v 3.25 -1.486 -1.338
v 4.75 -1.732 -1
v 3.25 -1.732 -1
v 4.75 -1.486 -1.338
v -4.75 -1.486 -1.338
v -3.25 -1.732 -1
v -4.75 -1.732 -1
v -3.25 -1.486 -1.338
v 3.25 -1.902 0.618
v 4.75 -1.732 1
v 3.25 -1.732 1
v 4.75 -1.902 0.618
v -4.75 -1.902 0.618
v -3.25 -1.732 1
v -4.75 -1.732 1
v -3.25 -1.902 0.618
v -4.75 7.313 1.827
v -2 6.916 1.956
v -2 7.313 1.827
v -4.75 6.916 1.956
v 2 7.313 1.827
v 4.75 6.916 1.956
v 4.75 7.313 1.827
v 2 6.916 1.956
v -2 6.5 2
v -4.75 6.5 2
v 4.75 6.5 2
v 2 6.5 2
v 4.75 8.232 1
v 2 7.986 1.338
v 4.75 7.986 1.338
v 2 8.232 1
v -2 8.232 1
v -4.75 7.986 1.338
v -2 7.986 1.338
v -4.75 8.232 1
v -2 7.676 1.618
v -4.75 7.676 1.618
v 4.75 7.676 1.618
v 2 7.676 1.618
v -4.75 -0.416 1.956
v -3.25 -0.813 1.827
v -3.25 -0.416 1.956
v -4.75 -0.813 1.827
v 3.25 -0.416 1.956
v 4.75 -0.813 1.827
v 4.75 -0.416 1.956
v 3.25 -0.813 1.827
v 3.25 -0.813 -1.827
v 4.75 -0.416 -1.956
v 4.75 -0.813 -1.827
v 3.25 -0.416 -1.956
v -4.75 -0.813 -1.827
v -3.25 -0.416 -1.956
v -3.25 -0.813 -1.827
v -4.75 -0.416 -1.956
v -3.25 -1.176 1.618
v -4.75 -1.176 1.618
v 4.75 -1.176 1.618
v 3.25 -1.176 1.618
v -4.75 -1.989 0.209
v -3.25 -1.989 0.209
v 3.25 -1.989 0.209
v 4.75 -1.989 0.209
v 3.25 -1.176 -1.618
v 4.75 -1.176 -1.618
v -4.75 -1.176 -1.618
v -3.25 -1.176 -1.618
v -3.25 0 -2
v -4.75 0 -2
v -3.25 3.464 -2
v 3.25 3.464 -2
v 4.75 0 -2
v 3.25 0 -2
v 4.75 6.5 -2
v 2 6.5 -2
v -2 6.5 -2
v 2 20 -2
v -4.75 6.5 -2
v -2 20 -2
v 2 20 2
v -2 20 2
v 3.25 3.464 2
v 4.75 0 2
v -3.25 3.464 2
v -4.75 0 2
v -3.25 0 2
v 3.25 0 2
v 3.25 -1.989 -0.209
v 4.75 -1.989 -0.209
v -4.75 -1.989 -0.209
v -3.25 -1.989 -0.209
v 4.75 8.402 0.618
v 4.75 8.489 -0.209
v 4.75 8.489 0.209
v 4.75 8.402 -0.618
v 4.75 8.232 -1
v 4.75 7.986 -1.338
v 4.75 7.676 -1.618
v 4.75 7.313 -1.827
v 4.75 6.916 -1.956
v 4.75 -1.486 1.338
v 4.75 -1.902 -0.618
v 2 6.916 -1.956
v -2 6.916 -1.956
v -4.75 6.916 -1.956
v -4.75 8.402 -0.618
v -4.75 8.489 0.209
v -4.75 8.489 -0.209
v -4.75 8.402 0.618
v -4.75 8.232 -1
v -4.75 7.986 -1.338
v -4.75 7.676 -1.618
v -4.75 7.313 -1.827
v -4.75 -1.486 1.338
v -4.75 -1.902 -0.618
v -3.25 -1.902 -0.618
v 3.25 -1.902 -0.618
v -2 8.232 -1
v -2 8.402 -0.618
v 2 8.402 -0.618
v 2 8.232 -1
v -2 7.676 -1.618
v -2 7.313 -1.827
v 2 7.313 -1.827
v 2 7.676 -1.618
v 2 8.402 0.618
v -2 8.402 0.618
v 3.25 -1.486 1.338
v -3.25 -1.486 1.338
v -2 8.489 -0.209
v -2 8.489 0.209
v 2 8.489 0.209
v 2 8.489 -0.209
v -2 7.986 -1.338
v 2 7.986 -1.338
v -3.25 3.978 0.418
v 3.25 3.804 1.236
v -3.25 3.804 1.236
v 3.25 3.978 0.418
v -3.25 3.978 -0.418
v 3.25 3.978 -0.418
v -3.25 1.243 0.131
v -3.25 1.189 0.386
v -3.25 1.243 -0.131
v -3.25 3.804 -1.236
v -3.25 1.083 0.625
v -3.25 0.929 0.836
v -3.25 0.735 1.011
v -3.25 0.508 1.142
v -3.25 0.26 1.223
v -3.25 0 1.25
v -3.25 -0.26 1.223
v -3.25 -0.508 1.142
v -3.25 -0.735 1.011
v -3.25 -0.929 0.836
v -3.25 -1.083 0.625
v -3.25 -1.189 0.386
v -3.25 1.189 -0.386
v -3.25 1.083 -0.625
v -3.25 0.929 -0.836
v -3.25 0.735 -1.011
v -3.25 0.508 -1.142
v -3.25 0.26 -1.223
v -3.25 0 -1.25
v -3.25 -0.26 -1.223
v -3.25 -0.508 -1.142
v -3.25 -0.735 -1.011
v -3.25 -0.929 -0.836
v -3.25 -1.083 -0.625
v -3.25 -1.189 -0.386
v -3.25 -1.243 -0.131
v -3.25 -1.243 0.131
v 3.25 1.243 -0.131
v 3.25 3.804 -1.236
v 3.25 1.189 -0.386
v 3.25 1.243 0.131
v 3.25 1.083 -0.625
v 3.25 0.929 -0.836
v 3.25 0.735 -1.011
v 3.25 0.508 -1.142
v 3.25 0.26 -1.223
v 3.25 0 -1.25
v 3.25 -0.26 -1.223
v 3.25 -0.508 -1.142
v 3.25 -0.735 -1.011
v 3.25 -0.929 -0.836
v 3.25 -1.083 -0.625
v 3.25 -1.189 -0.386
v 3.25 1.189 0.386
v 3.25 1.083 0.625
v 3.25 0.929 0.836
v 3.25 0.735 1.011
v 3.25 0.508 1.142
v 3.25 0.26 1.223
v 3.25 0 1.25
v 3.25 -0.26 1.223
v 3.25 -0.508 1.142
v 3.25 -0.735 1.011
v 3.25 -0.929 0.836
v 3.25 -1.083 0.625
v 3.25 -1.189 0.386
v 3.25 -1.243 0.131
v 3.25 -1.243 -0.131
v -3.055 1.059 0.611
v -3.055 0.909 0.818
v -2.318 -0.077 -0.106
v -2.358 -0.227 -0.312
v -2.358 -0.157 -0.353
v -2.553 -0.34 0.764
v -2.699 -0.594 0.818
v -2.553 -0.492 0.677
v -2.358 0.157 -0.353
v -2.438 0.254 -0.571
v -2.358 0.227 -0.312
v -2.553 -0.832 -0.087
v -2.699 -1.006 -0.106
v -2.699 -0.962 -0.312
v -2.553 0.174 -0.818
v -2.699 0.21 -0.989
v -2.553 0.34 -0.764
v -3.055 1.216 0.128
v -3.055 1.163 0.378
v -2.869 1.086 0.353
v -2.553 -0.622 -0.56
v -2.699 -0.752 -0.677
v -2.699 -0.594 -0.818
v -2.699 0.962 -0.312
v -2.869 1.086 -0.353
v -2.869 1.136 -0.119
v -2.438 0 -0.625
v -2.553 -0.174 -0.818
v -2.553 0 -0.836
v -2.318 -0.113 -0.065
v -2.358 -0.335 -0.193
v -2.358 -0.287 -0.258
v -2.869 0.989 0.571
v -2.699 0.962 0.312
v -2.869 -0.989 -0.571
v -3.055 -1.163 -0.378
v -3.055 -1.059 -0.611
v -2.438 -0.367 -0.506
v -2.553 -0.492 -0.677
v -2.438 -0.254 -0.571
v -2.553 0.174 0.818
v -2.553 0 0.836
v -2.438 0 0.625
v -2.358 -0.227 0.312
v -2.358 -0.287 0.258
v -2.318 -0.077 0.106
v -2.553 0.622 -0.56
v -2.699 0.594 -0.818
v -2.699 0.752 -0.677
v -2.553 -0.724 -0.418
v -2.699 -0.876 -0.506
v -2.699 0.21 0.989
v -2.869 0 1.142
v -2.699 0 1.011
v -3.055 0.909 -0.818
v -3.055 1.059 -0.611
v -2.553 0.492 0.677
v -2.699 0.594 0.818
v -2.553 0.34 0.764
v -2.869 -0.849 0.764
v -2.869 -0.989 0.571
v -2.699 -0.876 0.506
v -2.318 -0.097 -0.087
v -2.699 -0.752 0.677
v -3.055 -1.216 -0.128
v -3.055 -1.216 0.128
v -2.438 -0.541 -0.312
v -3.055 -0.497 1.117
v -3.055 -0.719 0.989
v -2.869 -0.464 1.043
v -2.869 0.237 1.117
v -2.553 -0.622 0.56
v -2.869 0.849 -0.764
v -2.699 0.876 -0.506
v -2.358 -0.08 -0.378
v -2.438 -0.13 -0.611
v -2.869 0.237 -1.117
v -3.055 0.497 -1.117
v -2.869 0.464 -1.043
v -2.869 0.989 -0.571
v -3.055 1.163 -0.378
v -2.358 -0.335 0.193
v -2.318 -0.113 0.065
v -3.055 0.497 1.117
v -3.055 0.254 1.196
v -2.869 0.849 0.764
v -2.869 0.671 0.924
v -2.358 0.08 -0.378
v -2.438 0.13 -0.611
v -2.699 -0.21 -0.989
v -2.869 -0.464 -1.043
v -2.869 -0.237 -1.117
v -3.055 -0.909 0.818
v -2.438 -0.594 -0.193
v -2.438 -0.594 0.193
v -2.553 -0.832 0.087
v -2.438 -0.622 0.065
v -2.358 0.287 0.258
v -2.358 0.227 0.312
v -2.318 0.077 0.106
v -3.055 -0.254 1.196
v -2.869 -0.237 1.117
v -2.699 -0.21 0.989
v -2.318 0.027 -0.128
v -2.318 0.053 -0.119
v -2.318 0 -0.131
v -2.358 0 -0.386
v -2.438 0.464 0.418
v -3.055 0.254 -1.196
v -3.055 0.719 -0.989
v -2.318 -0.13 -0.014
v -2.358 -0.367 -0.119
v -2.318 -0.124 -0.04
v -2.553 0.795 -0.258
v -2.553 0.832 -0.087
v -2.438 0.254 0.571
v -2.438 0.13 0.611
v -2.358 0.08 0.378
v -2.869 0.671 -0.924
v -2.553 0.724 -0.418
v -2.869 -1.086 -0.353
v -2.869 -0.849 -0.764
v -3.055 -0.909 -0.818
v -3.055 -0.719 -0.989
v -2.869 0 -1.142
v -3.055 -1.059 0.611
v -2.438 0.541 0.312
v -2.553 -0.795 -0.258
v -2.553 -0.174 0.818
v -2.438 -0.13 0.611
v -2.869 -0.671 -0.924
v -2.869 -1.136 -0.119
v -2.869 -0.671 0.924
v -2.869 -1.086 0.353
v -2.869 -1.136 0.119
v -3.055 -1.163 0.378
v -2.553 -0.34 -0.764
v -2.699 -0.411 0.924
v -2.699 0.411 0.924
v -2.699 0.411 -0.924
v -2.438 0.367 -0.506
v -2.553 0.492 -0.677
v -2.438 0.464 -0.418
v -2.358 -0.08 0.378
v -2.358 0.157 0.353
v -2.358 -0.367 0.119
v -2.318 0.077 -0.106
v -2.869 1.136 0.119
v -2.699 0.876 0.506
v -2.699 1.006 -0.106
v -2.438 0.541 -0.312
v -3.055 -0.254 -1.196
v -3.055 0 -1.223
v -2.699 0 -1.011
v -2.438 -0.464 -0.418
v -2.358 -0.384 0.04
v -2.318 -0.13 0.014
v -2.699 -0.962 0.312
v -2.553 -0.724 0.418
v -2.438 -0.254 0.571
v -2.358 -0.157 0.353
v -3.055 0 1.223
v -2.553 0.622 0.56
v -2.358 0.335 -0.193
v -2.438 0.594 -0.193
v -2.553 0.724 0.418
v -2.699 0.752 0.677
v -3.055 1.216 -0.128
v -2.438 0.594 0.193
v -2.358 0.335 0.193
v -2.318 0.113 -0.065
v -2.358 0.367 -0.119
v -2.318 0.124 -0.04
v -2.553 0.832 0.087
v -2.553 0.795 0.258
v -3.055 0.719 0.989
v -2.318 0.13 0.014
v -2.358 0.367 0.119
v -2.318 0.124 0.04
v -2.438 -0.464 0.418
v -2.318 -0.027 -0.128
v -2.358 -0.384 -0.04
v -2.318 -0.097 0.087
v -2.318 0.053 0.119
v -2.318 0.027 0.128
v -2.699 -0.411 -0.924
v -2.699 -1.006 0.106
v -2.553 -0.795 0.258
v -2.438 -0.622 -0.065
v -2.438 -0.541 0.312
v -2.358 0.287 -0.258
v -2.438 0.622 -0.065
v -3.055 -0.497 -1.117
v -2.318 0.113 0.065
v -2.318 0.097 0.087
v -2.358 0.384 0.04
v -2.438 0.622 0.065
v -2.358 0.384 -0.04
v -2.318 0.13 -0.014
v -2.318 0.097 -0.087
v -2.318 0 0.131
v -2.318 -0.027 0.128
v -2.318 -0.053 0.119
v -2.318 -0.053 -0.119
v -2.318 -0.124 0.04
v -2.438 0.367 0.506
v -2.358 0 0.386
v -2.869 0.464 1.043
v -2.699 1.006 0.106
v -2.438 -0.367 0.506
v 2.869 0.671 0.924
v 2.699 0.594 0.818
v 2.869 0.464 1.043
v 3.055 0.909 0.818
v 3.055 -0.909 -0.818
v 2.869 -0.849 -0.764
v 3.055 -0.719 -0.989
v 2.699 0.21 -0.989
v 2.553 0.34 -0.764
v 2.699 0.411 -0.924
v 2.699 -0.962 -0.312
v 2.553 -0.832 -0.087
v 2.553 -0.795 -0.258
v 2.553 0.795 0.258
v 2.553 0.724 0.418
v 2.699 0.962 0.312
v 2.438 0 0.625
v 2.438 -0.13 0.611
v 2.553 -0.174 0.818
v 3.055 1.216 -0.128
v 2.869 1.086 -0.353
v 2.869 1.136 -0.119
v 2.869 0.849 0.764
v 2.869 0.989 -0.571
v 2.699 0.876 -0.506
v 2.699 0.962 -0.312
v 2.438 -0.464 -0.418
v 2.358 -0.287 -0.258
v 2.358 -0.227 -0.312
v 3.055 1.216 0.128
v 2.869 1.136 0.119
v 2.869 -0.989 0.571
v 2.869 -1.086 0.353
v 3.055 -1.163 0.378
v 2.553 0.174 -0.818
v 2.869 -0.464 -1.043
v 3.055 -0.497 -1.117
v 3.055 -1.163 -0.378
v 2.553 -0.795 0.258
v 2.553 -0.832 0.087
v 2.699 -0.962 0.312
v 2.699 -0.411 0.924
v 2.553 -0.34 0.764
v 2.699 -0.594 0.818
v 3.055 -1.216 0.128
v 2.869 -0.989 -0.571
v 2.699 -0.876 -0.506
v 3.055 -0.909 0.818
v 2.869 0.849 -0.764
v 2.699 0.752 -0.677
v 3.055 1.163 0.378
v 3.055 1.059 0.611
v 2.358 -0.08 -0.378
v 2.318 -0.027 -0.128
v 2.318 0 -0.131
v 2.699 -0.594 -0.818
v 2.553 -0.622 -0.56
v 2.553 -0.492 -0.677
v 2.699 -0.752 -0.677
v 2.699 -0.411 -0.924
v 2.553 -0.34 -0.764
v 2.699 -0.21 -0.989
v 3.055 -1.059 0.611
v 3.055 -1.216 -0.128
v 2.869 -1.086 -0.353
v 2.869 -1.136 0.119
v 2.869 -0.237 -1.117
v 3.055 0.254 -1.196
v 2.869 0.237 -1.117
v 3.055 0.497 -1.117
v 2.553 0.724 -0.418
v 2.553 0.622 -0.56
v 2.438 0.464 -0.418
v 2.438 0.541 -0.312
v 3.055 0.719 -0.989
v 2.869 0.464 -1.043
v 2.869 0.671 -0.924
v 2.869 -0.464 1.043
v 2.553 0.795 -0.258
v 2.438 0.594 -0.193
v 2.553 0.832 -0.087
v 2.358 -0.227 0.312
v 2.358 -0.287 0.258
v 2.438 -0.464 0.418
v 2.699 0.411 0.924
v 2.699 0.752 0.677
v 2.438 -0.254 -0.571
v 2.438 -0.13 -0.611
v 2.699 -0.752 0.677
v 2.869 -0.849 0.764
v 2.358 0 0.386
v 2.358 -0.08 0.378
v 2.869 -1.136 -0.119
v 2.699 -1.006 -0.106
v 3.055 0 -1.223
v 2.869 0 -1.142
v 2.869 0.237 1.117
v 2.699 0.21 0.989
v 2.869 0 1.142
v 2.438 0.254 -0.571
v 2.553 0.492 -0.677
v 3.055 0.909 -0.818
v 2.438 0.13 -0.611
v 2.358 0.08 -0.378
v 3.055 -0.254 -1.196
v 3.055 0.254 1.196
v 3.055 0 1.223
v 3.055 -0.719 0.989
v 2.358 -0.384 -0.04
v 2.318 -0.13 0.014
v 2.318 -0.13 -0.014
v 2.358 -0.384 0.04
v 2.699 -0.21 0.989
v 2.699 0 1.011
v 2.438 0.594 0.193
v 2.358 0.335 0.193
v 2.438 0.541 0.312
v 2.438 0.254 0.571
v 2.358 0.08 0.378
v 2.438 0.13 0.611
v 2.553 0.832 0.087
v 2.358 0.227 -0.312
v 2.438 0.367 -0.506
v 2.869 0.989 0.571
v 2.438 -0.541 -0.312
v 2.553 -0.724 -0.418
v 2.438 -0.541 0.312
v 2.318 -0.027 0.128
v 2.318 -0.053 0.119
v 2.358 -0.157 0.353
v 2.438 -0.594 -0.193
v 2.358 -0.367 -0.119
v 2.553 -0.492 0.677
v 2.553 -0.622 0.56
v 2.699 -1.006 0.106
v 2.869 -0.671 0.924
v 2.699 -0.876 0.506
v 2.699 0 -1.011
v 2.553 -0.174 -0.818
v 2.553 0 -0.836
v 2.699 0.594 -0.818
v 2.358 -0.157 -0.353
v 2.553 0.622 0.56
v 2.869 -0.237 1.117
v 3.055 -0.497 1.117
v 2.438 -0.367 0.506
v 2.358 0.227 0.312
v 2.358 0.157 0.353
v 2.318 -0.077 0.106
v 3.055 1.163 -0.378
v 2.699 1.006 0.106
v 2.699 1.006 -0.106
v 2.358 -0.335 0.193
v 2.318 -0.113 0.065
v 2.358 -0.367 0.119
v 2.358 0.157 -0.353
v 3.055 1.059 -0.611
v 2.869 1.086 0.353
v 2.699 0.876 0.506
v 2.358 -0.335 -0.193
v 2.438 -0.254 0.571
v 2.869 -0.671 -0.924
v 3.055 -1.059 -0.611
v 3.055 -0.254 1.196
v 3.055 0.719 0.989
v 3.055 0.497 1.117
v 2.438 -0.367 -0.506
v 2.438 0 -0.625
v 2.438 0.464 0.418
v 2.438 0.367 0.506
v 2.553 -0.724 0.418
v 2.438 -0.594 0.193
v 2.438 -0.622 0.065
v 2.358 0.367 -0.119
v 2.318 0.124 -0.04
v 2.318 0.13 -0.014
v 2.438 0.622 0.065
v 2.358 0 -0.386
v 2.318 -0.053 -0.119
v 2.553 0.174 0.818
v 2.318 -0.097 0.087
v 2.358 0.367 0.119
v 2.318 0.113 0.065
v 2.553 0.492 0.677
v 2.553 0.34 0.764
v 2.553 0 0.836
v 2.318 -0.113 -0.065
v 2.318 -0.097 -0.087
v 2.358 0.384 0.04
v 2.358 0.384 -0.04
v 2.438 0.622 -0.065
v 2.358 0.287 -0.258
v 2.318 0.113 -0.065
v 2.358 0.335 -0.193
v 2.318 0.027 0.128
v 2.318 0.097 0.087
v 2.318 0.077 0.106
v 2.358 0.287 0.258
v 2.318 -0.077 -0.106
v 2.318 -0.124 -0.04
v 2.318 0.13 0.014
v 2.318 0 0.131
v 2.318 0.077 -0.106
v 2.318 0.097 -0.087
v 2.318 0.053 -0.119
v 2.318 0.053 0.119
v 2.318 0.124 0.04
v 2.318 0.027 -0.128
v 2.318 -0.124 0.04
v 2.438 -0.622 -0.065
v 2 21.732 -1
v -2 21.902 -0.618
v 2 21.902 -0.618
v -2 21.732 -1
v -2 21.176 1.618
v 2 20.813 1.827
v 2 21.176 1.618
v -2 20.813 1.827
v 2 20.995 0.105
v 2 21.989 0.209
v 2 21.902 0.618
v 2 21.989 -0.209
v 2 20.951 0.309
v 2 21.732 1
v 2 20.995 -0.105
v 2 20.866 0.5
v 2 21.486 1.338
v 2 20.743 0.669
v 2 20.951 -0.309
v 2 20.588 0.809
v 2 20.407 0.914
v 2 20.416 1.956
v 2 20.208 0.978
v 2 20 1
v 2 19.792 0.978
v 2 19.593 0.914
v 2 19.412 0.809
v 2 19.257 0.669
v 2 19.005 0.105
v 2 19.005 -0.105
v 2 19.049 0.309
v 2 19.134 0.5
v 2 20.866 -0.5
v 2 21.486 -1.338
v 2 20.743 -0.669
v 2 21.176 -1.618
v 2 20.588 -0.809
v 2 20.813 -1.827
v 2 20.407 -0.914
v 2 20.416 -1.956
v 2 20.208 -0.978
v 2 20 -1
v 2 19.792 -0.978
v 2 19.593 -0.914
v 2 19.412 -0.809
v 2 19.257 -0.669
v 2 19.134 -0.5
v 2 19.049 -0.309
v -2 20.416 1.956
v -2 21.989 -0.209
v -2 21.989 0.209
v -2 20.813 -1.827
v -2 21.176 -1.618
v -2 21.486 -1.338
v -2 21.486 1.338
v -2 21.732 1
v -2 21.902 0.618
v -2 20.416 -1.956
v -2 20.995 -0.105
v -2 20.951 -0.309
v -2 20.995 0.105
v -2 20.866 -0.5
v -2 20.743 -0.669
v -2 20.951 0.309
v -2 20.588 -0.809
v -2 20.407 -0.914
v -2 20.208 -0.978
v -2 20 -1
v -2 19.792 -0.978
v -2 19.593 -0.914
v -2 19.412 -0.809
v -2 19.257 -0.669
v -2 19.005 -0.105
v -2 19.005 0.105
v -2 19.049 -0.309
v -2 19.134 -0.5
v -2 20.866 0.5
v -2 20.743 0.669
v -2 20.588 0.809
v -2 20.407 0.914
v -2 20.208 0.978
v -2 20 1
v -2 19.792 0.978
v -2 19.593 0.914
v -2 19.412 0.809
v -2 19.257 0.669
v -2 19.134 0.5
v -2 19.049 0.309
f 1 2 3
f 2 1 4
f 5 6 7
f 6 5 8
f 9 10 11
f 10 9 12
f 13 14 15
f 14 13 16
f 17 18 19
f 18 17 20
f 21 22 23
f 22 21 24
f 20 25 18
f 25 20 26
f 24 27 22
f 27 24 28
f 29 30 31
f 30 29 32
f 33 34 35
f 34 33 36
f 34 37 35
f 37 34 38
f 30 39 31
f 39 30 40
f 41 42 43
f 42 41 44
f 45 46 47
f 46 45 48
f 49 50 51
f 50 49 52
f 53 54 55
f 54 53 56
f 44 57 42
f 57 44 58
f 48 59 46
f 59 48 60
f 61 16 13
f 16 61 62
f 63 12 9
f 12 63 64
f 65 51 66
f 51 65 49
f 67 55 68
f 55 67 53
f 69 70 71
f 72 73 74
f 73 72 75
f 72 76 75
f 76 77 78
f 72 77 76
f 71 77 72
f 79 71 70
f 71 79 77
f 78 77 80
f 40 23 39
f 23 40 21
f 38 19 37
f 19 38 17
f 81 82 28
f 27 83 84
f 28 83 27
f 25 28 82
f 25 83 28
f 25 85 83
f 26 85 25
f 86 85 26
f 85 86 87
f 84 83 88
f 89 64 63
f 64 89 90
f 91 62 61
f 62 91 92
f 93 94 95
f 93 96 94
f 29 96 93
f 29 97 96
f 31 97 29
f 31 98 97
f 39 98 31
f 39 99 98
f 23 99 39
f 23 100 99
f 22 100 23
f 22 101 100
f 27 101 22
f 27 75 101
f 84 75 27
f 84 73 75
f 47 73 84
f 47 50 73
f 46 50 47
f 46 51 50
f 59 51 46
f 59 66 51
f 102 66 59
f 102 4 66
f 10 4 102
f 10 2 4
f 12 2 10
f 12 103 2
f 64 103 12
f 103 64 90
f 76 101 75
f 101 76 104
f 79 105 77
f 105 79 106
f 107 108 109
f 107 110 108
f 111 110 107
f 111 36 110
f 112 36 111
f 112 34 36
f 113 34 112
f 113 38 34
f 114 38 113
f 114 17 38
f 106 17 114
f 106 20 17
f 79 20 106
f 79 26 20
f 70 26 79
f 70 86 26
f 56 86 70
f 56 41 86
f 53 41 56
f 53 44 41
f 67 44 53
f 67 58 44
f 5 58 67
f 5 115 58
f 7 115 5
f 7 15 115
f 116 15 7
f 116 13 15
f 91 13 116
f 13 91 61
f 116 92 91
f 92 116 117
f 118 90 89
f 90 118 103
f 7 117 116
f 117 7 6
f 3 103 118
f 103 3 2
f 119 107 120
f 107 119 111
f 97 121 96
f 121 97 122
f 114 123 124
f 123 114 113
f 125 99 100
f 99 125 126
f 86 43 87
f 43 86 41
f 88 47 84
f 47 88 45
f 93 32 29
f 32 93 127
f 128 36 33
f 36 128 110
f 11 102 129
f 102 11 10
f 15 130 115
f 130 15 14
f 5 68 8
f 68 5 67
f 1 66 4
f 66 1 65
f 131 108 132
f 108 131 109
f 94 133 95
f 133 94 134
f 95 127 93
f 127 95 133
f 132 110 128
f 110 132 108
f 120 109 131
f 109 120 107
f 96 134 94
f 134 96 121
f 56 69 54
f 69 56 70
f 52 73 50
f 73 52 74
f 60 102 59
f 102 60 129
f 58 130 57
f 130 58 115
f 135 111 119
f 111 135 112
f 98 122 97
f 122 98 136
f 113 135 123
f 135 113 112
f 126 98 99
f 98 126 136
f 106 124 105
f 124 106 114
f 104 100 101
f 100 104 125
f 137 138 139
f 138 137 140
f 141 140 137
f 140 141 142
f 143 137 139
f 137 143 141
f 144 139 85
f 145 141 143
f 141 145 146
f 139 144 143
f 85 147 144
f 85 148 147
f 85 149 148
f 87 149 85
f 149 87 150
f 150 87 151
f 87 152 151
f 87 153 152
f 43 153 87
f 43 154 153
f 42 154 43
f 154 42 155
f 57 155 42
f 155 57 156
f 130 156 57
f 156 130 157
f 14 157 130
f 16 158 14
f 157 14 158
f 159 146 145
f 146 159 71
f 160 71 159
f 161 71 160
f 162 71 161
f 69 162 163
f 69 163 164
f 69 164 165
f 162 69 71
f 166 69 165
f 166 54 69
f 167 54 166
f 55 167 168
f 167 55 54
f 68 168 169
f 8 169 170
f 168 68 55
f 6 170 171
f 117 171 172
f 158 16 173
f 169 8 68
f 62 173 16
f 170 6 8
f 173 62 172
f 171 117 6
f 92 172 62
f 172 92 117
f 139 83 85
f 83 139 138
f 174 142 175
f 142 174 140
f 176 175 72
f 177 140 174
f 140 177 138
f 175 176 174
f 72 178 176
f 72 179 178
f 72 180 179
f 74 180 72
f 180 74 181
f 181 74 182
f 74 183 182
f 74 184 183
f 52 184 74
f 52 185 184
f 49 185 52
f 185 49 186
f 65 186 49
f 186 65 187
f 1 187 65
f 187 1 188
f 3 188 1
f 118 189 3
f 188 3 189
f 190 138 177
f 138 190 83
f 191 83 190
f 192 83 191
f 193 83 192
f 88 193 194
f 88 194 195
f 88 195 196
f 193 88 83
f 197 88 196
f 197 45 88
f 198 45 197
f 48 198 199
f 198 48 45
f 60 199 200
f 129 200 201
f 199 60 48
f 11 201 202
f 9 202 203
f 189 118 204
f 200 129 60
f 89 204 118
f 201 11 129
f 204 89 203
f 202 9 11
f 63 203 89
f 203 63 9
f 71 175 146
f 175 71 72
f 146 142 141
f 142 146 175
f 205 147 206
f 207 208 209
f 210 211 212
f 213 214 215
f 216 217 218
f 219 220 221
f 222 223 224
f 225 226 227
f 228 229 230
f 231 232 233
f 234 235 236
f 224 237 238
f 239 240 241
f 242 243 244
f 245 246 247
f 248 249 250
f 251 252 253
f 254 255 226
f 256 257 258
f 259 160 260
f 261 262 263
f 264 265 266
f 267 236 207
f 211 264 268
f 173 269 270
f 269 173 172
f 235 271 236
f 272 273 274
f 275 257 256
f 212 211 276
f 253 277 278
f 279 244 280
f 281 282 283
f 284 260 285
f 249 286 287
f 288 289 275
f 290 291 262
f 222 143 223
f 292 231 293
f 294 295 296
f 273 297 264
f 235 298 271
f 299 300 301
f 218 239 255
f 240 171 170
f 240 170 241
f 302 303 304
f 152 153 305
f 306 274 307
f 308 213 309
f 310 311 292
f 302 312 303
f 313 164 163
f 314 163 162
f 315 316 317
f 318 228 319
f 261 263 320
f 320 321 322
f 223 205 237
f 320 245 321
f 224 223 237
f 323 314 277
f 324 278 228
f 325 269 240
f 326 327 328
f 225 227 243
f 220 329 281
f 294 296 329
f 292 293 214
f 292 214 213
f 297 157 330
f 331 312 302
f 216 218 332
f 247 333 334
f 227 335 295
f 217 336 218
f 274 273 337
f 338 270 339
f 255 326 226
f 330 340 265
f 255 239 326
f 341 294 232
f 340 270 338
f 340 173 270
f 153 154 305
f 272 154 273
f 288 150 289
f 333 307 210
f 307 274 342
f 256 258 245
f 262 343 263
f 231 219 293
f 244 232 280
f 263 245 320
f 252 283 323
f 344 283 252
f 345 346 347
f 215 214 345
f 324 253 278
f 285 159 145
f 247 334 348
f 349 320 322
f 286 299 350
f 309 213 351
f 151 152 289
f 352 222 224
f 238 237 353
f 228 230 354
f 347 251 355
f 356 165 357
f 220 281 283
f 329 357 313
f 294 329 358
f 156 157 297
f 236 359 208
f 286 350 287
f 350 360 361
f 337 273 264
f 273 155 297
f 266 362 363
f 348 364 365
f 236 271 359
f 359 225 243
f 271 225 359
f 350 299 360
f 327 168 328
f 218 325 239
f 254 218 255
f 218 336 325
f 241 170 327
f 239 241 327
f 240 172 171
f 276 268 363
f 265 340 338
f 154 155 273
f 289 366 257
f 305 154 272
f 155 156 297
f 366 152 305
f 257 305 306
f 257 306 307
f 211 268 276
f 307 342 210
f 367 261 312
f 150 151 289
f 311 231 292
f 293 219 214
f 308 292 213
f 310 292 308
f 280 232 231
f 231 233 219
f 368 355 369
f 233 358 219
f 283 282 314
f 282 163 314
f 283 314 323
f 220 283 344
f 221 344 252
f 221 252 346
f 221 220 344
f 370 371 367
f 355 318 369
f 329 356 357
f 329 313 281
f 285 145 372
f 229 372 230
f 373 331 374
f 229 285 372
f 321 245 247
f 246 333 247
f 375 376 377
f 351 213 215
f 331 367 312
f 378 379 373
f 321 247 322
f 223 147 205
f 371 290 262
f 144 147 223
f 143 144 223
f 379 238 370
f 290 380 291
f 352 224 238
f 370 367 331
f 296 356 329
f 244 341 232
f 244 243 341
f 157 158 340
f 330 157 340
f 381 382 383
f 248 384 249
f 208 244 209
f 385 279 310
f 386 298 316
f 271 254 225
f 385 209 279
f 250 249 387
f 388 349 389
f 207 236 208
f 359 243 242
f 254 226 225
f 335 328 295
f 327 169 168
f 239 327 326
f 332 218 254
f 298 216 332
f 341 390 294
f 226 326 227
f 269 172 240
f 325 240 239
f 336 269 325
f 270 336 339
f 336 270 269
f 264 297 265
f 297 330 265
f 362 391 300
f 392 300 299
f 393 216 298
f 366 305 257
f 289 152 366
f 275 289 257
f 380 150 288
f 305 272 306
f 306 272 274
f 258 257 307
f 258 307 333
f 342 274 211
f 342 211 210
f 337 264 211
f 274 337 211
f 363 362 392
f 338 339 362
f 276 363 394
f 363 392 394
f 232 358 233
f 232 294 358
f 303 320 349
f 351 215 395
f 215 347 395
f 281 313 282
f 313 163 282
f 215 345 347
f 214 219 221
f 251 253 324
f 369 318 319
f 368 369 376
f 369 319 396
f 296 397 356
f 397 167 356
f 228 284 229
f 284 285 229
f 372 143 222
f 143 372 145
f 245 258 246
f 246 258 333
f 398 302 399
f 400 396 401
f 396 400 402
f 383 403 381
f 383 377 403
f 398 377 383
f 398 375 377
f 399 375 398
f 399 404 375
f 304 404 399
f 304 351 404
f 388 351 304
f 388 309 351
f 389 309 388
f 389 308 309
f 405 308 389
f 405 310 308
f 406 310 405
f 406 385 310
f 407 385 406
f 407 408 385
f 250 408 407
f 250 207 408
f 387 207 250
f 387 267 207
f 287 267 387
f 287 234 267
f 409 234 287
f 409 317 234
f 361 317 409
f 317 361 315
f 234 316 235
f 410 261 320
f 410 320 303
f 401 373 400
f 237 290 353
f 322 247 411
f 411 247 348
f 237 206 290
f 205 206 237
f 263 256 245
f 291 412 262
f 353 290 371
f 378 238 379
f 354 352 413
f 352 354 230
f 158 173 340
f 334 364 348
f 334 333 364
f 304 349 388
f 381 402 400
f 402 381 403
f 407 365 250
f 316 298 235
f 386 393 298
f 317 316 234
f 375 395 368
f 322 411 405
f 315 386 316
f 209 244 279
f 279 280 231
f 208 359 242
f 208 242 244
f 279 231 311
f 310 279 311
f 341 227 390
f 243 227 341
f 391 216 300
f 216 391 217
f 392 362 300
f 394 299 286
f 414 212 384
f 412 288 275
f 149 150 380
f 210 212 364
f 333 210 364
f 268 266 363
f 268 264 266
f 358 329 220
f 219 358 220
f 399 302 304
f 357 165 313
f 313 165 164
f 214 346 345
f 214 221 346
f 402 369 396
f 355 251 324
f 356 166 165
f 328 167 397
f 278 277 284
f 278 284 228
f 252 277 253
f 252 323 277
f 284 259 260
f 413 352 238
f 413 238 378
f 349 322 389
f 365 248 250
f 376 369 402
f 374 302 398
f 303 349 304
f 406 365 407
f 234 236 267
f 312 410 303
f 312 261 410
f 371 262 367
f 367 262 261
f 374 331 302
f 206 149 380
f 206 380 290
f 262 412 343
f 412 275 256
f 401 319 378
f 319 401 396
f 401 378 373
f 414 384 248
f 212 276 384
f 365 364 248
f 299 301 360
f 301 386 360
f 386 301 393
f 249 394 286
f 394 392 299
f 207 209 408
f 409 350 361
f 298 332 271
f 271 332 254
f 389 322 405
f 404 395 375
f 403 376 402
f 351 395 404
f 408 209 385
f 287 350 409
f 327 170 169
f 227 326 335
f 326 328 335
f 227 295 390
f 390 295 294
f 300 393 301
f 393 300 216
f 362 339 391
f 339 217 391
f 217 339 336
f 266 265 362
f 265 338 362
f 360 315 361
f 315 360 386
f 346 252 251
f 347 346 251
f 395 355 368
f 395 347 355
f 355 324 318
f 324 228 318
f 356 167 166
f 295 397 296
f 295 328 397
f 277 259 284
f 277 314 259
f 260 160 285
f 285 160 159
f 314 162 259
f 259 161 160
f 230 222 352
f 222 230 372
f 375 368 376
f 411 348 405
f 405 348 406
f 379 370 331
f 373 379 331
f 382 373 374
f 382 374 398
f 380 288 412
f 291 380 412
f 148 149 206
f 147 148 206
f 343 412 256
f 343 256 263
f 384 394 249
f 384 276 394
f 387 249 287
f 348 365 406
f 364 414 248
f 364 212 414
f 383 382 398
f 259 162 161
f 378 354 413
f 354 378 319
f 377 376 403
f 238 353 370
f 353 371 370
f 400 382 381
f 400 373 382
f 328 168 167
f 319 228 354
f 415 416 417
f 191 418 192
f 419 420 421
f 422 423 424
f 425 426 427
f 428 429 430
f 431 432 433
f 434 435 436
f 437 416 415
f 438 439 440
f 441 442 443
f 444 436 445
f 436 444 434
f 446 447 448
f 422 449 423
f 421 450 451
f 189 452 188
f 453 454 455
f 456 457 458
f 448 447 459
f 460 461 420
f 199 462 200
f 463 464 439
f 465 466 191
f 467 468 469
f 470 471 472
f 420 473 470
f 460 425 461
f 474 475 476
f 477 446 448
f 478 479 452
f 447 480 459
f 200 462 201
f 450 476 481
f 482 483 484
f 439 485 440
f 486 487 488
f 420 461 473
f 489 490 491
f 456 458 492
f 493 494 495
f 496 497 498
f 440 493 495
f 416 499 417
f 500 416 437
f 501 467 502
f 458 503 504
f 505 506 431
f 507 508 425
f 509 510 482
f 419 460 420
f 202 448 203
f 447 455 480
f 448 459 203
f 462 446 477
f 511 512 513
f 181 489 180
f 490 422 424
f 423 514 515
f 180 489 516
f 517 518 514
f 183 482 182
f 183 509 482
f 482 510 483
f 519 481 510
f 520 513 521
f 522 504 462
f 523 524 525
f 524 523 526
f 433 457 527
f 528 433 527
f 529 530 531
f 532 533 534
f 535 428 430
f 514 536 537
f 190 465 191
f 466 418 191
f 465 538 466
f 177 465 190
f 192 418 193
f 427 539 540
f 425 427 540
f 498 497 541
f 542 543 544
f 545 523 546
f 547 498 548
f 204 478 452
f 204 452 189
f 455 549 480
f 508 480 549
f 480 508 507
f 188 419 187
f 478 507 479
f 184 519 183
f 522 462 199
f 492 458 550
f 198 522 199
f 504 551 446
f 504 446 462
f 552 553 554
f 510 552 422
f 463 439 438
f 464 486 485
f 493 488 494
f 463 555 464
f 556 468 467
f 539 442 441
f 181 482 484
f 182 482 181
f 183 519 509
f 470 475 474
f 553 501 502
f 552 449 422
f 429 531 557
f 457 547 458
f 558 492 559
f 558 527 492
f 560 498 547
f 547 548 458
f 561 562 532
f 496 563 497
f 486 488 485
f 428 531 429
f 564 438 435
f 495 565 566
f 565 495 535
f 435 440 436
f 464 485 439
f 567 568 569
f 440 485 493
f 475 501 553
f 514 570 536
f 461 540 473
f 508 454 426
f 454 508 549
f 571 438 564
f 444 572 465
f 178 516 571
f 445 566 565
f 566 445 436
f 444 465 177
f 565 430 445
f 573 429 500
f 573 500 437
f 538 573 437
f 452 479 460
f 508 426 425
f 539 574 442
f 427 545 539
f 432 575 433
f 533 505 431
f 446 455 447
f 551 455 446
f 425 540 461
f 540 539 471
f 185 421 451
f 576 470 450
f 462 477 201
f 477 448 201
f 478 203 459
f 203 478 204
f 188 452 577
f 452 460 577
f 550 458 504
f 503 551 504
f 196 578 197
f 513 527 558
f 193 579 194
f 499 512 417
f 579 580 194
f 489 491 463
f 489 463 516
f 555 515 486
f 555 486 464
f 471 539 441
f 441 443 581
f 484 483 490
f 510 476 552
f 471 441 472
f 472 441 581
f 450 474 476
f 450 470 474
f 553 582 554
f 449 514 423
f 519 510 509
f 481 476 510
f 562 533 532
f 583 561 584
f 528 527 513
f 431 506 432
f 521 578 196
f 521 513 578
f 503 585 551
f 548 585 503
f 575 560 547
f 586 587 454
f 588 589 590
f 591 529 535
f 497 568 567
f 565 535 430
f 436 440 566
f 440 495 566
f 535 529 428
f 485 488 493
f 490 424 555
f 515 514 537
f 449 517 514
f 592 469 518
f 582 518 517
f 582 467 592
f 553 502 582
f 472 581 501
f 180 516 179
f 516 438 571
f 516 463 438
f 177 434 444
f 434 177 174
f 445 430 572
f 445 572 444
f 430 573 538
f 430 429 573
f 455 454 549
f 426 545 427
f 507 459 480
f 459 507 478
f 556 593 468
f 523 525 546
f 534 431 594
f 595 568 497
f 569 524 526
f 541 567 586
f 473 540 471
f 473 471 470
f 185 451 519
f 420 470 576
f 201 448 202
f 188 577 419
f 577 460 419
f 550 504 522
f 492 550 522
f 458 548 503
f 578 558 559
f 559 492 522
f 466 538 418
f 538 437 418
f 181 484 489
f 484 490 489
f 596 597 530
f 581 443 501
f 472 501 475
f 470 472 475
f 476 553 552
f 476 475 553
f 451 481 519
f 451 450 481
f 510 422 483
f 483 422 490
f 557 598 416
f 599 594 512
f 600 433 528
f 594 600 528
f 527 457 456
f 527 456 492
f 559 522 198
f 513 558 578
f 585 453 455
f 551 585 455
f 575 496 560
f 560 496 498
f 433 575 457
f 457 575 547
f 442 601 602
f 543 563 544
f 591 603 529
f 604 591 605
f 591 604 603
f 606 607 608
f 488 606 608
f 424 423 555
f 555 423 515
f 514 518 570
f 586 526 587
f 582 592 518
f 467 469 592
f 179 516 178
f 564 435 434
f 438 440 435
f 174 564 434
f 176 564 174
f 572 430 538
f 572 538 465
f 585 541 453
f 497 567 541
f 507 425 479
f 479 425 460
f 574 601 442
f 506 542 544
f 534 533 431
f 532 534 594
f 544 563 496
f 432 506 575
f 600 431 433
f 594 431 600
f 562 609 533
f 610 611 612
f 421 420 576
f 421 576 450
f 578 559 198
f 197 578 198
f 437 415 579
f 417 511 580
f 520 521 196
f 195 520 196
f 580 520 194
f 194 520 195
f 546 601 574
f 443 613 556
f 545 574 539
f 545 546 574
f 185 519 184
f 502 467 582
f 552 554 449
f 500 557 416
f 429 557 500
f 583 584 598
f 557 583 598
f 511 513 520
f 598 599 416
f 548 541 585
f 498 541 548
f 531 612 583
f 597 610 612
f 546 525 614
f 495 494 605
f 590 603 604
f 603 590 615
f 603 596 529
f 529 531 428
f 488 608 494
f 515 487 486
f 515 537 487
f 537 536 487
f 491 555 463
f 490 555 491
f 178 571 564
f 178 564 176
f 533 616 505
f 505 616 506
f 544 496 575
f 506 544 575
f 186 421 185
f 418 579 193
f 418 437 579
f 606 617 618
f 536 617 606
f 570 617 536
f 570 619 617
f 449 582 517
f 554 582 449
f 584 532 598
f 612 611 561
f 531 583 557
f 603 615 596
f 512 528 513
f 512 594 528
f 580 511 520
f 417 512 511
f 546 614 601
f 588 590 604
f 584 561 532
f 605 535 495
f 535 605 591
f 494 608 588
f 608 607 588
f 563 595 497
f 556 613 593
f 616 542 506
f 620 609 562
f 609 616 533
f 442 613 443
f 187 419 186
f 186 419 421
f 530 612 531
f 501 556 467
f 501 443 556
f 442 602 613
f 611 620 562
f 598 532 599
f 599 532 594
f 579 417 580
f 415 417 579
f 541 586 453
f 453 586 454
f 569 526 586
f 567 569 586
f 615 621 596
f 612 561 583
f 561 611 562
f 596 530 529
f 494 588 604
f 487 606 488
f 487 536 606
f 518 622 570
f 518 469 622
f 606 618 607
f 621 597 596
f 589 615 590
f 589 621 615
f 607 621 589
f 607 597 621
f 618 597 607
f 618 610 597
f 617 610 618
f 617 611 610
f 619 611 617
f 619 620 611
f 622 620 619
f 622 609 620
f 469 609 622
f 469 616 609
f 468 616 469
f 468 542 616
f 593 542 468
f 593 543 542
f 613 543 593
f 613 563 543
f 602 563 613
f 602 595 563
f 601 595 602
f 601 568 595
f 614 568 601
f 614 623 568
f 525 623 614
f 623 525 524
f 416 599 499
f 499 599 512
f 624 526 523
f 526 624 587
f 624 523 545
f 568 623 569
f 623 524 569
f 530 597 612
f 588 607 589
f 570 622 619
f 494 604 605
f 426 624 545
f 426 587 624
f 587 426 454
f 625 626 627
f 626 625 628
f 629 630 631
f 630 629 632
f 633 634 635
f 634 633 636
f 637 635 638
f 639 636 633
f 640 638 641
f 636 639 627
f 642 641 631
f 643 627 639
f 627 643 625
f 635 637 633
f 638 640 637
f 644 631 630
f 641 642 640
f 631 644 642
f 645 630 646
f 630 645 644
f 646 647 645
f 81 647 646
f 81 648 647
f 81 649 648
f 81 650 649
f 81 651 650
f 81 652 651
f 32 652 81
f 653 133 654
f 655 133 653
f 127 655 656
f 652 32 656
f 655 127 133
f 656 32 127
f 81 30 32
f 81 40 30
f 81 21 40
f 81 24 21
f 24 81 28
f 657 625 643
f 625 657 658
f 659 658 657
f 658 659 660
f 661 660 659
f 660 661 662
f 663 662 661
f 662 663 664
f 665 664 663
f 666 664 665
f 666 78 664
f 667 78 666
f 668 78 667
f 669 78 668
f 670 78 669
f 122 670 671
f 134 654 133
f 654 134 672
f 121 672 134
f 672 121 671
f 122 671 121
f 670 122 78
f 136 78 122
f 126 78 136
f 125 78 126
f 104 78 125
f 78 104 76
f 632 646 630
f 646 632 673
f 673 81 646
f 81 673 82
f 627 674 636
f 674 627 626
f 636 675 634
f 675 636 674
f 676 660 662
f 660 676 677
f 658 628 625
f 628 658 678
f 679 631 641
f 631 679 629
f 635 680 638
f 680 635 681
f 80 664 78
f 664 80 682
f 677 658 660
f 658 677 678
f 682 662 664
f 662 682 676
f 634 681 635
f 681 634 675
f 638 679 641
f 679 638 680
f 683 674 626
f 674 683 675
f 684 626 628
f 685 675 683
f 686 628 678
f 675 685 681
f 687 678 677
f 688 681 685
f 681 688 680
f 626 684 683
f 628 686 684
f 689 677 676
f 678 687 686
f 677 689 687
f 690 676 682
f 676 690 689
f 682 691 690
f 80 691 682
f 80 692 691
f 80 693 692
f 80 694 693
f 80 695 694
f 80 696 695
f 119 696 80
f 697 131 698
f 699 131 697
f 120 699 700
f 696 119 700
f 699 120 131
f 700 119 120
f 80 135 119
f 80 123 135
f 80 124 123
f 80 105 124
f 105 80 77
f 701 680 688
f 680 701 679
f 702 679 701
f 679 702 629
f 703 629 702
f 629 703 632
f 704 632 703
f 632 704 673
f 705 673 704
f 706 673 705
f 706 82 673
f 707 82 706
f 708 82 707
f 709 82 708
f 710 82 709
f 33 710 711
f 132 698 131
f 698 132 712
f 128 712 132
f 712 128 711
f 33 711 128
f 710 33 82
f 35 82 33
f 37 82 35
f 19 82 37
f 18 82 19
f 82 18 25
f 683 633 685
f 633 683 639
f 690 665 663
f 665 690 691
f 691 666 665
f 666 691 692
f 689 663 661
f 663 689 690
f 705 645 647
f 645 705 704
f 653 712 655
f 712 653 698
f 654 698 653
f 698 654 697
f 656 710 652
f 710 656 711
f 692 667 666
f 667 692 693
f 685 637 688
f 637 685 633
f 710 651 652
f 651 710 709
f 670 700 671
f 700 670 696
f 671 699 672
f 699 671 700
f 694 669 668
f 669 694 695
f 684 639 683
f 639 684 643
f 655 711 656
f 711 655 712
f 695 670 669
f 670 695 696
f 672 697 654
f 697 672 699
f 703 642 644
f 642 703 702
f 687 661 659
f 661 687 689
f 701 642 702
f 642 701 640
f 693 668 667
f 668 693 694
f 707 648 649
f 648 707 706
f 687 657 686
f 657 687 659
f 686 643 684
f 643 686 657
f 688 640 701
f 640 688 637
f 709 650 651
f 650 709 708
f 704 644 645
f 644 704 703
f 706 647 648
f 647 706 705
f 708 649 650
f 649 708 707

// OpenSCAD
WALL_THICKNESS = 1.5;
LENGTH = 20;

TOP_THICKNESS = 4;
TOP_INNER_DIA = 2;

BOT_THICKNESS = 6.5;
BOT_INNER_DIA = 2.5;

ROD_LENGTH = LENGTH - BOT_THICKNESS - TOP_THICKNESS;
ROD_WIDTH = 4;


$fn = 30;

module bot_mount() {
  rotate([0, 90, 0])
  translate([0, 0, -BOT_THICKNESS/2-WALL_THICKNESS])
  union() {
    difference() {
      hull() {
        cylinder(d = ROD_WIDTH, h = BOT_THICKNESS + 2 * WALL_THICKNESS);
        translate([0, BOT_THICKNESS, 0])
        cylinder(d = ROD_WIDTH, h = BOT_THICKNESS + 2 * WALL_THICKNESS);
      }
      translate([0, 0, WALL_THICKNESS])
      cylinder(d = BOT_THICKNESS + WALL_THICKNESS, h = BOT_THICKNESS);
    }
    translate([0, 0, WALL_THICKNESS])
    scale([1.0, 1.0, 0.75])
    sphere(d = BOT_INNER_DIA);

    translate([0, 0, BOT_THICKNESS + WALL_THICKNESS])
    scale([1.0, 1.0, 0.75])
    sphere(d = BOT_INNER_DIA);
  }
}

module top_mount() {
  translate([0, ROD_LENGTH + BOT_THICKNESS, 0])
  rotate([0, 90, 0])
  translate([0, 0, -TOP_THICKNESS/2])
  difference() {
    hull() {
      cylinder(d = ROD_WIDTH, h = TOP_THICKNESS);
      translate([0, TOP_THICKNESS, 0])
      cylinder(d = ROD_WIDTH, h = TOP_THICKNESS);
    }
    translate([0, TOP_THICKNESS, 0])
    cylinder(d = TOP_INNER_DIA, h = TOP_THICKNESS);
  }
}

module rod() {
  translate([0, ROD_LENGTH/2 + BOT_THICKNESS, 0])
  cube([ROD_WIDTH, ROD_LENGTH, ROD_WIDTH], center = true);
}

module mount() {
  union() {
    bot_mount();
    rod();
    top_mount();
  }
}

mount();
